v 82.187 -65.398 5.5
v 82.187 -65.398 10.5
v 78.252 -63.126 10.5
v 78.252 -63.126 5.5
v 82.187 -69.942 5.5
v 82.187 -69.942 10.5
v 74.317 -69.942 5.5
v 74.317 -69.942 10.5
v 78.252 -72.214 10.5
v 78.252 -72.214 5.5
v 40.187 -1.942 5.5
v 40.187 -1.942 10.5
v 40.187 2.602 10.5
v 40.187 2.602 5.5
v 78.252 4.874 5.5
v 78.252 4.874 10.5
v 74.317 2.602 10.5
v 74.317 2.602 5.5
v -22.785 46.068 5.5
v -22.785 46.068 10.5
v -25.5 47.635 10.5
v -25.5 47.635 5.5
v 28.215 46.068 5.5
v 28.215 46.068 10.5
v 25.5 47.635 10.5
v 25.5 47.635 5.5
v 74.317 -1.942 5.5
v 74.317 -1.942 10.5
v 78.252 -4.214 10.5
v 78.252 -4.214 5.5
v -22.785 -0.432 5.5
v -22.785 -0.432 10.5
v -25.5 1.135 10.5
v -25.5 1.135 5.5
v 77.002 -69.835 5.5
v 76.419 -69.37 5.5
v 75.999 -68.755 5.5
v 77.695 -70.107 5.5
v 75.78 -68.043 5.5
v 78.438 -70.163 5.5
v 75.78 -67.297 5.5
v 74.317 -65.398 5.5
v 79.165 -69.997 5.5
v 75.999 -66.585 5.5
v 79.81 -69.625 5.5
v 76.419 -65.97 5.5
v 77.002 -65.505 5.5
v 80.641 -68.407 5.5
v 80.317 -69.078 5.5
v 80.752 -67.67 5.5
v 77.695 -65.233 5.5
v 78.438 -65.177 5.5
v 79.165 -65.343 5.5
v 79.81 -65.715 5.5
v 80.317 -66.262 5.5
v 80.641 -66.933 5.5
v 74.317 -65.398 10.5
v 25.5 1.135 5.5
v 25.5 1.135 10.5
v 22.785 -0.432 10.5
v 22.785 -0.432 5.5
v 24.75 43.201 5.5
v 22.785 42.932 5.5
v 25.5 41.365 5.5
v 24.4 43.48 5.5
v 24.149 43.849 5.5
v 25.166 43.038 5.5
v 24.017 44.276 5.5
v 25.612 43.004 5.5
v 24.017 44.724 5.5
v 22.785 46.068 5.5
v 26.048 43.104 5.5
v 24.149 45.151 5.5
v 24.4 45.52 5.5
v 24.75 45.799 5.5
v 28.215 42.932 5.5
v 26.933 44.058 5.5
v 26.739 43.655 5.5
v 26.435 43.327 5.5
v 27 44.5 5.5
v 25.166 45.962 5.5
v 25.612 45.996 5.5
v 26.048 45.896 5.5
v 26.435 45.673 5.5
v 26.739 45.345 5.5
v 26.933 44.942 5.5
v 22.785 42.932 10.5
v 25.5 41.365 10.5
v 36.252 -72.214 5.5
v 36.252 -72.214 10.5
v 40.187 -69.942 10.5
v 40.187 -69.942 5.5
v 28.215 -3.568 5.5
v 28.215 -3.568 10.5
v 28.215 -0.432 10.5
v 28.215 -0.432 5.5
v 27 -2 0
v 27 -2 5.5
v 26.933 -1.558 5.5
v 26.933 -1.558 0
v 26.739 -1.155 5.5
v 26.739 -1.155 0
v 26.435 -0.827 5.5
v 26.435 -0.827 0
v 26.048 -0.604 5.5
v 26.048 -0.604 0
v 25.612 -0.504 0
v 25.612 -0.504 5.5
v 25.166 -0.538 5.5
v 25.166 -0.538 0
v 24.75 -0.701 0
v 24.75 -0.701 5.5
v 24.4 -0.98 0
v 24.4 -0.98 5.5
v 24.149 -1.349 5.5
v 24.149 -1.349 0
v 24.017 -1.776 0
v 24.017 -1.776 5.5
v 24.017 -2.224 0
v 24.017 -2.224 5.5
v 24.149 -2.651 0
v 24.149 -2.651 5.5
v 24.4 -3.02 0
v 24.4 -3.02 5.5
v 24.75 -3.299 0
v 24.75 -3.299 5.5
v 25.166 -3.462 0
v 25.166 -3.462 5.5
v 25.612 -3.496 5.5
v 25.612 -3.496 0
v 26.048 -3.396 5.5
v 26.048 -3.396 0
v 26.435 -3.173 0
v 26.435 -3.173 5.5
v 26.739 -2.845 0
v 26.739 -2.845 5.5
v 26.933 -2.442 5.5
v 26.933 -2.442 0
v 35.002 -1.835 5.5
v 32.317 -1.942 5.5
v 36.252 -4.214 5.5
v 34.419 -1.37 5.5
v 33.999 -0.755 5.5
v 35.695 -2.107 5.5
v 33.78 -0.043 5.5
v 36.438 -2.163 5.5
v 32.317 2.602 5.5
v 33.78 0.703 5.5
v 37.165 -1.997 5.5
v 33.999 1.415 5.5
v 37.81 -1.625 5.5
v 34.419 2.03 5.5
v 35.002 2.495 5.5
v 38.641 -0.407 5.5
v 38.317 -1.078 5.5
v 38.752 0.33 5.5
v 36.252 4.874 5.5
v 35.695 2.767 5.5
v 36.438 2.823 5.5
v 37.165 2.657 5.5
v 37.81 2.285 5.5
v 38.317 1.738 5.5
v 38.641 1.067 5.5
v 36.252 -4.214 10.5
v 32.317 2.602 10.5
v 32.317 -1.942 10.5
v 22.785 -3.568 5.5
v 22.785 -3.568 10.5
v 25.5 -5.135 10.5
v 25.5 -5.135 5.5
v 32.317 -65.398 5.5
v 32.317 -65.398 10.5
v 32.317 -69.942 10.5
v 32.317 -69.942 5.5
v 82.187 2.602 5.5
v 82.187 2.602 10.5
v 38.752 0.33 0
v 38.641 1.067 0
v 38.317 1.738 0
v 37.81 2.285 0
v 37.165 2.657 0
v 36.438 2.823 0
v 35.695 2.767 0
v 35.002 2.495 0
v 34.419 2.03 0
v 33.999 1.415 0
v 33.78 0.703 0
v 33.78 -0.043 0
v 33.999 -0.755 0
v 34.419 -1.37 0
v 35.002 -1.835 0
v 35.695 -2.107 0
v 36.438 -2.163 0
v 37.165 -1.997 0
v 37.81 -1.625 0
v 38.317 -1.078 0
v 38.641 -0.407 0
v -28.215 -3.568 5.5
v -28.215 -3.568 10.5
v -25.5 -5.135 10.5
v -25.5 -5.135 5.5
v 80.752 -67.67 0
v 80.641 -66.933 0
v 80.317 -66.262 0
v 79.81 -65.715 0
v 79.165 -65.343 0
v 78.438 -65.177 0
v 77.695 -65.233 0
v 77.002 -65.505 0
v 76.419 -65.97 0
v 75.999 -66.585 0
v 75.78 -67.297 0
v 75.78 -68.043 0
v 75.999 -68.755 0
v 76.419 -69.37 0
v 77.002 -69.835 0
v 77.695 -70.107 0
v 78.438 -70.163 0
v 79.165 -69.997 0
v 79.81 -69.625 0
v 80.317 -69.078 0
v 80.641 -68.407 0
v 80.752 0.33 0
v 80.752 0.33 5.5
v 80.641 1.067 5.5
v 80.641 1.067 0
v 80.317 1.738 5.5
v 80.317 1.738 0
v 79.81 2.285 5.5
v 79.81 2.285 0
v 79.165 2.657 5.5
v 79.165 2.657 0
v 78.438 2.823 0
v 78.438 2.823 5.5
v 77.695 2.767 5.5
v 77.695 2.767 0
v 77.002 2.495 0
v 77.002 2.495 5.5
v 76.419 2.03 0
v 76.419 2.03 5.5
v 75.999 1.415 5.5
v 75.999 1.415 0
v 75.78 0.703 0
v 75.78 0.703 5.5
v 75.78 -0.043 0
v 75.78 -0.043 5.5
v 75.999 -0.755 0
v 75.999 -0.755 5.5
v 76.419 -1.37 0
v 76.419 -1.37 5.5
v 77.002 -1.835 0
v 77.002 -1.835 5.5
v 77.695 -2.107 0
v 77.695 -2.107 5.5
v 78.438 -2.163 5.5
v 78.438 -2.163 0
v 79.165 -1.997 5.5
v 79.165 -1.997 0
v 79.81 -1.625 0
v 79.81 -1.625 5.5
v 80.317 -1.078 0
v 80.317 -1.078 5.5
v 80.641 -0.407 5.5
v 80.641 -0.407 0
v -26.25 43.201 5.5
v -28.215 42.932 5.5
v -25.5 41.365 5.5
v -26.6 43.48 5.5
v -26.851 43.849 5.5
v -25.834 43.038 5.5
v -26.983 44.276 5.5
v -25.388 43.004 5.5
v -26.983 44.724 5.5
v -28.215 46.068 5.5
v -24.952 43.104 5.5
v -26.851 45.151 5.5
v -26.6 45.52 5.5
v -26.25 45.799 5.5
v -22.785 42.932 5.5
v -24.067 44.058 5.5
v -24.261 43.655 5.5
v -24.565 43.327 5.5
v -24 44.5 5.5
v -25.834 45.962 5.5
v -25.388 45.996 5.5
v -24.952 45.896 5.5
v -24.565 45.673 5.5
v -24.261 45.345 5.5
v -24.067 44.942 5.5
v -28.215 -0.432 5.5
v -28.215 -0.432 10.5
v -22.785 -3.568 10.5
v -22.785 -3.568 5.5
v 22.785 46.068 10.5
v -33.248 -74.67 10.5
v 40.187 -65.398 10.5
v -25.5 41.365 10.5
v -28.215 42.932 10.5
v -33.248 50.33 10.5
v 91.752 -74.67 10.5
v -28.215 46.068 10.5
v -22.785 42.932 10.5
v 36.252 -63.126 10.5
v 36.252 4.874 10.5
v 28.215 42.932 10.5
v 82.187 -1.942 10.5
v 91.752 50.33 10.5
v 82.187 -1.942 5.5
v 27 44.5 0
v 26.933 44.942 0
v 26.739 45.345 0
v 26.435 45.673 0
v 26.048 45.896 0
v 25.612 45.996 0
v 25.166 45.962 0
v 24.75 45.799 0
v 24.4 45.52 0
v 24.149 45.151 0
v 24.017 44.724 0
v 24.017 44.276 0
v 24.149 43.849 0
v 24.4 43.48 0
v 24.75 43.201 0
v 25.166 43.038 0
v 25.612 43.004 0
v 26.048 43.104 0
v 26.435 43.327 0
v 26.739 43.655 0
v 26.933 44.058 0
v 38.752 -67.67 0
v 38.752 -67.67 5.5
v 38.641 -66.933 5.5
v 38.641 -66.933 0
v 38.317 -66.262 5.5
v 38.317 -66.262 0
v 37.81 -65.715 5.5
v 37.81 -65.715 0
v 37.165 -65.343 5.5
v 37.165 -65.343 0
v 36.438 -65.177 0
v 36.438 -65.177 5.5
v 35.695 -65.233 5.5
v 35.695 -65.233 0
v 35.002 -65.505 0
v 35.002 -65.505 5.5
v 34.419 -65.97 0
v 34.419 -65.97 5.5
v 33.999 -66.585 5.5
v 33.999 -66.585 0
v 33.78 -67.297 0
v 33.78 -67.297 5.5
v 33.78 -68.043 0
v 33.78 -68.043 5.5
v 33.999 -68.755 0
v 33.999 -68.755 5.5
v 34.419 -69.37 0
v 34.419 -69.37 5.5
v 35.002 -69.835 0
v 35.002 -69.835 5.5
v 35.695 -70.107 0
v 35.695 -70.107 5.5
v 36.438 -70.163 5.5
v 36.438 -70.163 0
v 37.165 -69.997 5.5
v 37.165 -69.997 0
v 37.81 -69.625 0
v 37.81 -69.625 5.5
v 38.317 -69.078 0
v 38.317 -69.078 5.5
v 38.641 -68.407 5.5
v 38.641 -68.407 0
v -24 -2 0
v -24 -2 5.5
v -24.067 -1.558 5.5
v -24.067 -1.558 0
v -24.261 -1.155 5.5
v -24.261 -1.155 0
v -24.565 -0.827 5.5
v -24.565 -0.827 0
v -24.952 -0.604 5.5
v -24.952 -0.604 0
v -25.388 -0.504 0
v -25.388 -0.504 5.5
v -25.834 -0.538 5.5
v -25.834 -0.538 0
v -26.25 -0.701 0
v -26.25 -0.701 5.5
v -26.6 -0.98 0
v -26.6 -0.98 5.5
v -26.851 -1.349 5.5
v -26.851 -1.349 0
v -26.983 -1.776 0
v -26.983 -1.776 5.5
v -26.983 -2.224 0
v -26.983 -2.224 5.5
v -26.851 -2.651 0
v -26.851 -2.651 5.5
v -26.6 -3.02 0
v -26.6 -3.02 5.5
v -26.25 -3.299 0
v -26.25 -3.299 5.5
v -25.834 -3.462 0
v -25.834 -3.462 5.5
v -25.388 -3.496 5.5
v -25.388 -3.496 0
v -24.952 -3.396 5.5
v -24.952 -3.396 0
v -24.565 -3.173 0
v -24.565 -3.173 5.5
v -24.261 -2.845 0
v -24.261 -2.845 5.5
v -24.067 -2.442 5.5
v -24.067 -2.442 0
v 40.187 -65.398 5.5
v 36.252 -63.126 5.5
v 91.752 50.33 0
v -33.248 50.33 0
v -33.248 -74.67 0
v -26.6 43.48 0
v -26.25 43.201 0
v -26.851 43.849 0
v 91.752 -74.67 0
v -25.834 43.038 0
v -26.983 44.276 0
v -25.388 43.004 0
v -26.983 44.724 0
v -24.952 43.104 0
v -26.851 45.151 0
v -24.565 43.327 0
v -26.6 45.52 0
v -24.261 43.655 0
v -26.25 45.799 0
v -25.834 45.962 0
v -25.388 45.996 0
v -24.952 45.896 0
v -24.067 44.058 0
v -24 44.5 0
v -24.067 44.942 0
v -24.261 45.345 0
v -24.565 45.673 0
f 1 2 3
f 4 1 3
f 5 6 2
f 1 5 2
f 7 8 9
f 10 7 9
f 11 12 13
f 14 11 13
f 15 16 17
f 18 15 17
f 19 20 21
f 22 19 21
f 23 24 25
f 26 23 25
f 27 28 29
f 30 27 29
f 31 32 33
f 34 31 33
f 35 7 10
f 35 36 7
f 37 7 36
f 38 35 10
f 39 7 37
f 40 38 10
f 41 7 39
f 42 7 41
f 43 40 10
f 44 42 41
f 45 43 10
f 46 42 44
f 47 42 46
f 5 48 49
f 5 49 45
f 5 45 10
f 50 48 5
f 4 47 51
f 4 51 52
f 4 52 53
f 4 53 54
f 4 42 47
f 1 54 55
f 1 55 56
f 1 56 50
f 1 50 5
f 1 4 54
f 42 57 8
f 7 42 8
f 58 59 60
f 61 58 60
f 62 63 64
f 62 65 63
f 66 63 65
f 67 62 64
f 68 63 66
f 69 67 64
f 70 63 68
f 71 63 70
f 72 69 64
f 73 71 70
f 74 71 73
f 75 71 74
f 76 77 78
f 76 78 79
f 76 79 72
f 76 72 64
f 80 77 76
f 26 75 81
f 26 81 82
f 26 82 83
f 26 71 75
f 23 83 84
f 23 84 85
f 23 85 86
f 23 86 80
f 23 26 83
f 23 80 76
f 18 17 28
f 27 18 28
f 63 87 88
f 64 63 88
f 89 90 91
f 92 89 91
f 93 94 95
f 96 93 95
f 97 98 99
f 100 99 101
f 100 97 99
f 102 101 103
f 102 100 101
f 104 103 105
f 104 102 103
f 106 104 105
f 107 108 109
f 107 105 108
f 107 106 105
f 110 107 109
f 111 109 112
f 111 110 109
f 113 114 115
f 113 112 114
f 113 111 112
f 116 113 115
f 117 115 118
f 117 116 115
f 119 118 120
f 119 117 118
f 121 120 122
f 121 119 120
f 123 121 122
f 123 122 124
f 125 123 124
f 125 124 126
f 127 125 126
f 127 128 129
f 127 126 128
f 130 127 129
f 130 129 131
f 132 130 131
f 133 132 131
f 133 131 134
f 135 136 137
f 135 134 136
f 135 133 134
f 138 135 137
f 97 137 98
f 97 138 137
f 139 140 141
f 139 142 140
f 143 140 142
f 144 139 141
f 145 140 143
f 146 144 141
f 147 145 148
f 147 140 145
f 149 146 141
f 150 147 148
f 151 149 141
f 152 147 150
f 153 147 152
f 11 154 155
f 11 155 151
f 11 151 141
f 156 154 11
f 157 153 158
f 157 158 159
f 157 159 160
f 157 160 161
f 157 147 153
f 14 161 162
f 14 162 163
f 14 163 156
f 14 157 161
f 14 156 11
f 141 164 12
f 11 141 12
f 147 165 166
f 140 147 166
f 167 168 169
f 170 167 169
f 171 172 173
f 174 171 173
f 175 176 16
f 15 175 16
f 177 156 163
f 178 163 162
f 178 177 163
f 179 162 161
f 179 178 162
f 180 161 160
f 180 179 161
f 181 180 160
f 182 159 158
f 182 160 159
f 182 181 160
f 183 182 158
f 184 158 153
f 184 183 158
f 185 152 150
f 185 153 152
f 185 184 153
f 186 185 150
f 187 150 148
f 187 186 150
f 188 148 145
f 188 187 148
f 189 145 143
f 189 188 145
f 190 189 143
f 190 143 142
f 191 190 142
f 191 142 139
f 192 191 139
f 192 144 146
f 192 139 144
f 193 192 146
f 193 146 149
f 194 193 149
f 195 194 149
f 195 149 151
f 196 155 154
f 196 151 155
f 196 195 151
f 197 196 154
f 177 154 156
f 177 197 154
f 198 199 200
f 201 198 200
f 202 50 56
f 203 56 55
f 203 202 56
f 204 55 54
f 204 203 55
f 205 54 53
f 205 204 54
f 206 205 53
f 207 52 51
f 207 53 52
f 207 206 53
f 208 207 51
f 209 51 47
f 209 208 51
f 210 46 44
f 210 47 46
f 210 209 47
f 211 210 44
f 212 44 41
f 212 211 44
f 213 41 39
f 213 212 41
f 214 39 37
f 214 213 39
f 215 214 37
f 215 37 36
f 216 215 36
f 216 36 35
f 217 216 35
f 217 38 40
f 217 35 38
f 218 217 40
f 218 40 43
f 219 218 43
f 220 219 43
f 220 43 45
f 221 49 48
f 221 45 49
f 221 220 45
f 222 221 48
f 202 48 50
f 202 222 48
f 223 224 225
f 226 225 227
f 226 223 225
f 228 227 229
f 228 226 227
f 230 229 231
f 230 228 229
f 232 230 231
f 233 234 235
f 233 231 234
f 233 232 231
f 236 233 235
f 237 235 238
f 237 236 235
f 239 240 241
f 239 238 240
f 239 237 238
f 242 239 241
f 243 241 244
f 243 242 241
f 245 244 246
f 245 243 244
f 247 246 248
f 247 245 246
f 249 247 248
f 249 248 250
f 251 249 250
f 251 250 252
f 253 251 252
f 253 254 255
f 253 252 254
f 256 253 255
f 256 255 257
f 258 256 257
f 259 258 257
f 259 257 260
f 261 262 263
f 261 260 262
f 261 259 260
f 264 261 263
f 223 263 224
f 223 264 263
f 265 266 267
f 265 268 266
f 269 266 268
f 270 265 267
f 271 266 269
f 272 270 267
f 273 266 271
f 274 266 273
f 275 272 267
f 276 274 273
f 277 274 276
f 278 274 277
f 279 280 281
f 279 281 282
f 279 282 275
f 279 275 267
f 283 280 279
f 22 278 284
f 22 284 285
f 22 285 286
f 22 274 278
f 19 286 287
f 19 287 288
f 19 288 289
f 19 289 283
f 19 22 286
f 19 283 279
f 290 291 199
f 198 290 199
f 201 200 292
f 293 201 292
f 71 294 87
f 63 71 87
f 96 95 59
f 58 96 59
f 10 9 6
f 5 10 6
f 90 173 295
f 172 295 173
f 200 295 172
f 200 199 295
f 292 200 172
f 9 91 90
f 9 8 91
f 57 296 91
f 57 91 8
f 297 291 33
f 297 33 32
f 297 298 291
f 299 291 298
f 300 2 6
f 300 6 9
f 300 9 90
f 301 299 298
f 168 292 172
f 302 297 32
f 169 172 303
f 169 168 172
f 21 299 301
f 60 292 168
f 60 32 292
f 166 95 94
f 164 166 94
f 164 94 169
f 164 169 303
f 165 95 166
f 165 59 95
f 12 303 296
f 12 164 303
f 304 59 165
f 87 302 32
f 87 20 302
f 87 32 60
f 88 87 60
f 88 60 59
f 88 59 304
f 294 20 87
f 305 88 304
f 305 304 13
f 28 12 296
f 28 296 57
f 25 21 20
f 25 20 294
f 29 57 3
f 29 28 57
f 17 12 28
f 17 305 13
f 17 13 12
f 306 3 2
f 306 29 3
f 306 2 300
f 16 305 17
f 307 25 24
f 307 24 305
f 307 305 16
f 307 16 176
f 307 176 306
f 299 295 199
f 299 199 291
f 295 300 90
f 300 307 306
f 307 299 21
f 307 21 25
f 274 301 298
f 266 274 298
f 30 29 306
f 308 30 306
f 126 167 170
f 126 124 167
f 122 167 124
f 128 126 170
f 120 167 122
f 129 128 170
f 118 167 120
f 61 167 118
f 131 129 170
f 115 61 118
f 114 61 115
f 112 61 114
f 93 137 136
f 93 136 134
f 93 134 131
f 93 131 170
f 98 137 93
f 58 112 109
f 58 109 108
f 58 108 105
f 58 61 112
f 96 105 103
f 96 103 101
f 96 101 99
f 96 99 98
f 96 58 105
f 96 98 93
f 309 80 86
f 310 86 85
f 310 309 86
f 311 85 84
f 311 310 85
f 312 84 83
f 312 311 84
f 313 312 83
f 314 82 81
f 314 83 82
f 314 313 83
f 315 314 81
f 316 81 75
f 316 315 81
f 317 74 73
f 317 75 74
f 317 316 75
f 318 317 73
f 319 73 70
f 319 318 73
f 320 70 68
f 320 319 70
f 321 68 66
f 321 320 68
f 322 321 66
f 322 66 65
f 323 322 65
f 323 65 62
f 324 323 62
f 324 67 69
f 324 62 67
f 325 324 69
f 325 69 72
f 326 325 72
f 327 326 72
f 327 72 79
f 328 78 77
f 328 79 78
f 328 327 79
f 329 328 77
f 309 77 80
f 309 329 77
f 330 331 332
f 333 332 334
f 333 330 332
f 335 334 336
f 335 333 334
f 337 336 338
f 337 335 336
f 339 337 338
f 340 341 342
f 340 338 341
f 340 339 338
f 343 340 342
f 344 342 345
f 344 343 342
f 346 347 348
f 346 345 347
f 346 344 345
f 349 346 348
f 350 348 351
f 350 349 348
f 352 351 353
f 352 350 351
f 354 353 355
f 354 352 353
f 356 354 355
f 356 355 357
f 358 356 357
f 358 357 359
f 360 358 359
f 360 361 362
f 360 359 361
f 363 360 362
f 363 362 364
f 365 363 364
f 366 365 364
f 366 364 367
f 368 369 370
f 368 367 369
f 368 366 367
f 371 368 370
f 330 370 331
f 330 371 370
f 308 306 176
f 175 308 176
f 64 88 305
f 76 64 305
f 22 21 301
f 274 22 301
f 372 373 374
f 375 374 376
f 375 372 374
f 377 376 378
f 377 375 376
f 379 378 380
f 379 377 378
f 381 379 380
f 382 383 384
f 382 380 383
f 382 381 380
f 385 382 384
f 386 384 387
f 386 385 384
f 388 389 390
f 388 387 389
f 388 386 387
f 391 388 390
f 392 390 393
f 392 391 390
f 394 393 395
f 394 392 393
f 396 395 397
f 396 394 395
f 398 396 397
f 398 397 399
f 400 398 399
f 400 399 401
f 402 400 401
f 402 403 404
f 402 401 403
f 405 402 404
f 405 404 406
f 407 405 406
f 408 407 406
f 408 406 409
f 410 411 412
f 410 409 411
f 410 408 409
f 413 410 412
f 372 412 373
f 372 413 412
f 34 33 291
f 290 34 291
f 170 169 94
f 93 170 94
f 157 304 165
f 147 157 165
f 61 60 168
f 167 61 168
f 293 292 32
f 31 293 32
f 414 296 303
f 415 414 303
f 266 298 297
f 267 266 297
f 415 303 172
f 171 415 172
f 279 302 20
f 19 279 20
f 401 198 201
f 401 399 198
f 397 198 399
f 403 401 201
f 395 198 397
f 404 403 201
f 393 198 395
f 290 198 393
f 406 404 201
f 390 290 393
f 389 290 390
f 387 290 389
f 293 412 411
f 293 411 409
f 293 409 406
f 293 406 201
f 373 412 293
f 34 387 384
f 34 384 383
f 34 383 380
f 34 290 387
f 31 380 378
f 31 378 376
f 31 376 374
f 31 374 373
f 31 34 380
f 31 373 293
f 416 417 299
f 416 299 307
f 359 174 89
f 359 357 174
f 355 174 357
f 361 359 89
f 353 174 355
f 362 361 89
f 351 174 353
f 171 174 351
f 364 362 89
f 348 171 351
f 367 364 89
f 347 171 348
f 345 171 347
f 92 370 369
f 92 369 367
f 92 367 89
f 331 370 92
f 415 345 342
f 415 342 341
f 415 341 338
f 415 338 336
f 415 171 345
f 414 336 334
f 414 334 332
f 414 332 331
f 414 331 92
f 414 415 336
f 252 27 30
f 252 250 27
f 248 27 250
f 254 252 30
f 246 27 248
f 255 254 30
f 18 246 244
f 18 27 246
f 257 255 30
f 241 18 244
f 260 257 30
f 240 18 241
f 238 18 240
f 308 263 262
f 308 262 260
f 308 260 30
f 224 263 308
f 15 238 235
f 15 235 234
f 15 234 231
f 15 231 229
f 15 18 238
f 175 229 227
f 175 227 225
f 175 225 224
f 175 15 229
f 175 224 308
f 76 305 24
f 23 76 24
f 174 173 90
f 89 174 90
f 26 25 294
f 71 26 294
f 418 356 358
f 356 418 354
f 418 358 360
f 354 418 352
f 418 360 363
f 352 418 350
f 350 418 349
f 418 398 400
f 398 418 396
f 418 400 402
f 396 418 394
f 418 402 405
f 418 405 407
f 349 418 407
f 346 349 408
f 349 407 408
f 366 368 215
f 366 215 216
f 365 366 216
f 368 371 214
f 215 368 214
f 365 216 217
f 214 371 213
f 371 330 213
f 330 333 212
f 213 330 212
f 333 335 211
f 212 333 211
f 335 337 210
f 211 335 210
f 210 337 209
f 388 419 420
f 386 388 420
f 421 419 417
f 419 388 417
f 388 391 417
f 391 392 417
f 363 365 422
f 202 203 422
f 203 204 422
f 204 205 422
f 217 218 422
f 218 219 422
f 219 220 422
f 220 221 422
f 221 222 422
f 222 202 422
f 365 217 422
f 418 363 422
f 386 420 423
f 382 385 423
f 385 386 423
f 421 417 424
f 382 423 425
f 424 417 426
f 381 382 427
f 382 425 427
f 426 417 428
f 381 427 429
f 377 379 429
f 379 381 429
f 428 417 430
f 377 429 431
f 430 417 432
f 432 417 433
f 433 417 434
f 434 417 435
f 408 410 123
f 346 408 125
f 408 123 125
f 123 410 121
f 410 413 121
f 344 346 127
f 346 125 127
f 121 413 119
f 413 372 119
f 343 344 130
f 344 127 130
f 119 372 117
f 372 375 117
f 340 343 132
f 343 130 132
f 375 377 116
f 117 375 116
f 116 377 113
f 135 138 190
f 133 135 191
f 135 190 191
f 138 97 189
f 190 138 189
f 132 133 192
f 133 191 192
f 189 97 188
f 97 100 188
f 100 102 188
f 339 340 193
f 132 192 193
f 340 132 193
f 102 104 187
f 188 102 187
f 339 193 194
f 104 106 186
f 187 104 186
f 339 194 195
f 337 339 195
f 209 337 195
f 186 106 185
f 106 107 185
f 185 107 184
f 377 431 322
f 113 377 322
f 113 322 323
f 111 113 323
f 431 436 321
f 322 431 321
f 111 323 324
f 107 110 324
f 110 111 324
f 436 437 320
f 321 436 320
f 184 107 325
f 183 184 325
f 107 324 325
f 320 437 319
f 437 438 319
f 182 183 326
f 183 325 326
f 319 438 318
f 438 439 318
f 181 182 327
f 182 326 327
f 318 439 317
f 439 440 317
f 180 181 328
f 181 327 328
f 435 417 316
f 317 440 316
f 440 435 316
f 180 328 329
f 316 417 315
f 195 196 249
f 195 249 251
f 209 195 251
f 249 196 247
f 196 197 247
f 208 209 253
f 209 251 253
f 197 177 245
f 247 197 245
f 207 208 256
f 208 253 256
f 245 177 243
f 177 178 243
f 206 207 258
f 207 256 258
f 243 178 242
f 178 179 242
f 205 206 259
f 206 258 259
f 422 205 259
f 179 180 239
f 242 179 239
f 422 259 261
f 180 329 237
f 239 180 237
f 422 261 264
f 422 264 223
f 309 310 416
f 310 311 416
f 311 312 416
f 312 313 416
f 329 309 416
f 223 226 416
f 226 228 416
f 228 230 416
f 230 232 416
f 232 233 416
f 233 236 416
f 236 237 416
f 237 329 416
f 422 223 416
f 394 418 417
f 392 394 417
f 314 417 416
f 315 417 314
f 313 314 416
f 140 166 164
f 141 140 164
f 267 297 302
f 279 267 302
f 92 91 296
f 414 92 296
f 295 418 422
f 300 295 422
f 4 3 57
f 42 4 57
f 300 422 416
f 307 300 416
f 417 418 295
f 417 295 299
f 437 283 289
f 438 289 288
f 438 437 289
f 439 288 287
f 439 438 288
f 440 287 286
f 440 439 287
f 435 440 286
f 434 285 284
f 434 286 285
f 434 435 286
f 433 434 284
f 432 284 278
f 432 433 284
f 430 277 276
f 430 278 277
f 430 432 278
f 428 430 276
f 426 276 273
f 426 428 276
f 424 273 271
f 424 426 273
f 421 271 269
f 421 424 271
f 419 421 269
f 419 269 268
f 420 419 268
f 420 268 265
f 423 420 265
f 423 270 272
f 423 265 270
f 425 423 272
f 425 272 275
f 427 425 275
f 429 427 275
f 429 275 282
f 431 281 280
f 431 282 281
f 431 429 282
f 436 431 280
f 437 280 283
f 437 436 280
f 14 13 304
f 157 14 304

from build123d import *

# Parameters (mm, degrees)
SKETCH2_W           = 125
SKETCH2_H           = 125
SKETCH2_R           = 1.5
SKETCH2_R_2         = 2.5
BOSS_EXTRUDE1_DEPTH = 10.5
CUT_EXTRUDE1_DEPTH  = 5


with BuildPart() as part:
    # Sketch2 → Boss-Extrude1 (new body)
    with BuildSketch(Plane.XY):
        with Locations((29.251653193, -12.17)):
            Rectangle(SKETCH2_W, SKETCH2_H)
        with Locations((-25.5, -2)):
            Circle(SKETCH2_R, mode=Mode.SUBTRACT)
        with Locations((25.5, -2)):
            Circle(SKETCH2_R, mode=Mode.SUBTRACT)
        with Locations((78.251653193, 0.33)):
            Circle(SKETCH2_R_2, mode=Mode.SUBTRACT)
        with Locations((36.251653193, 0.33)):
            Circle(SKETCH2_R_2, mode=Mode.SUBTRACT)
        with Locations((36.251653193, -67.67)):
            Circle(SKETCH2_R_2, mode=Mode.SUBTRACT)
        with Locations((78.251653193, -67.67)):
            Circle(SKETCH2_R_2, mode=Mode.SUBTRACT)
        with Locations((25.5, 44.5)):
            Circle(SKETCH2_R, mode=Mode.SUBTRACT)
        with Locations((-25.5, 44.5)):
            Circle(SKETCH2_R, mode=Mode.SUBTRACT)
    extrude(amount=BOSS_EXTRUDE1_DEPTH)

    # Sketch3 → Cut-Extrude1 (cut)
    with BuildSketch(Plane.XY.offset(10.5)):
        Polygon((74.316653193, -69.941873309), (78.251653193, -72.213746619), (82.186653193, -69.941873309), (82.186653193, -65.398126691), (78.251653193, -63.126253381), (74.316653193, -65.398126691), align=None)
        Polygon((36.251653193, -72.213746619), (40.186653193, -69.941873309), (40.186653193, -65.398126691), (36.251653193, -63.126253381), (32.316653193, -65.398126691), (32.316653193, -69.941873309), align=None)
        Polygon((36.251653193, -4.213746619), (40.186653193, -1.941873309), (40.186653193, 2.601873309), (36.251653193, 4.873746619), (32.316653193, 2.601873309), (32.316653193, -1.941873309), align=None)
        Polygon((78.251653193, -4.213746619), (82.186653193, -1.941873309), (82.186653193, 2.601873309), (78.251653193, 4.873746619), (74.316653193, 2.601873309), (74.316653193, -1.941873309), align=None)
        Polygon((22.785, -3.567505981), (25.5, -5.135011962), (28.215, -3.567505981), (28.215, -0.432494019), (25.5, 1.135011962), (22.785, -0.432494019), align=None)
        Polygon((-28.215, -3.567505981), (-25.5, -5.135011962), (-22.785, -3.567505981), (-22.785, -0.432494019), (-25.5, 1.135011962), (-28.215, -0.432494019), align=None)
        Polygon((22.785, 42.932494019), (25.5, 41.364988038), (28.215, 42.932494019), (28.215, 46.067505981), (25.5, 47.635011962), (22.785, 46.067505981), align=None)
        Polygon((-28.215, 42.932494019), (-25.5, 41.364988038), (-22.785, 42.932494019), (-22.785, 46.067505981), (-25.5, 47.635011962), (-28.215, 46.067505981), align=None)
    extrude(amount=-CUT_EXTRUDE1_DEPTH, mode=Mode.SUBTRACT)


solid = part.part
